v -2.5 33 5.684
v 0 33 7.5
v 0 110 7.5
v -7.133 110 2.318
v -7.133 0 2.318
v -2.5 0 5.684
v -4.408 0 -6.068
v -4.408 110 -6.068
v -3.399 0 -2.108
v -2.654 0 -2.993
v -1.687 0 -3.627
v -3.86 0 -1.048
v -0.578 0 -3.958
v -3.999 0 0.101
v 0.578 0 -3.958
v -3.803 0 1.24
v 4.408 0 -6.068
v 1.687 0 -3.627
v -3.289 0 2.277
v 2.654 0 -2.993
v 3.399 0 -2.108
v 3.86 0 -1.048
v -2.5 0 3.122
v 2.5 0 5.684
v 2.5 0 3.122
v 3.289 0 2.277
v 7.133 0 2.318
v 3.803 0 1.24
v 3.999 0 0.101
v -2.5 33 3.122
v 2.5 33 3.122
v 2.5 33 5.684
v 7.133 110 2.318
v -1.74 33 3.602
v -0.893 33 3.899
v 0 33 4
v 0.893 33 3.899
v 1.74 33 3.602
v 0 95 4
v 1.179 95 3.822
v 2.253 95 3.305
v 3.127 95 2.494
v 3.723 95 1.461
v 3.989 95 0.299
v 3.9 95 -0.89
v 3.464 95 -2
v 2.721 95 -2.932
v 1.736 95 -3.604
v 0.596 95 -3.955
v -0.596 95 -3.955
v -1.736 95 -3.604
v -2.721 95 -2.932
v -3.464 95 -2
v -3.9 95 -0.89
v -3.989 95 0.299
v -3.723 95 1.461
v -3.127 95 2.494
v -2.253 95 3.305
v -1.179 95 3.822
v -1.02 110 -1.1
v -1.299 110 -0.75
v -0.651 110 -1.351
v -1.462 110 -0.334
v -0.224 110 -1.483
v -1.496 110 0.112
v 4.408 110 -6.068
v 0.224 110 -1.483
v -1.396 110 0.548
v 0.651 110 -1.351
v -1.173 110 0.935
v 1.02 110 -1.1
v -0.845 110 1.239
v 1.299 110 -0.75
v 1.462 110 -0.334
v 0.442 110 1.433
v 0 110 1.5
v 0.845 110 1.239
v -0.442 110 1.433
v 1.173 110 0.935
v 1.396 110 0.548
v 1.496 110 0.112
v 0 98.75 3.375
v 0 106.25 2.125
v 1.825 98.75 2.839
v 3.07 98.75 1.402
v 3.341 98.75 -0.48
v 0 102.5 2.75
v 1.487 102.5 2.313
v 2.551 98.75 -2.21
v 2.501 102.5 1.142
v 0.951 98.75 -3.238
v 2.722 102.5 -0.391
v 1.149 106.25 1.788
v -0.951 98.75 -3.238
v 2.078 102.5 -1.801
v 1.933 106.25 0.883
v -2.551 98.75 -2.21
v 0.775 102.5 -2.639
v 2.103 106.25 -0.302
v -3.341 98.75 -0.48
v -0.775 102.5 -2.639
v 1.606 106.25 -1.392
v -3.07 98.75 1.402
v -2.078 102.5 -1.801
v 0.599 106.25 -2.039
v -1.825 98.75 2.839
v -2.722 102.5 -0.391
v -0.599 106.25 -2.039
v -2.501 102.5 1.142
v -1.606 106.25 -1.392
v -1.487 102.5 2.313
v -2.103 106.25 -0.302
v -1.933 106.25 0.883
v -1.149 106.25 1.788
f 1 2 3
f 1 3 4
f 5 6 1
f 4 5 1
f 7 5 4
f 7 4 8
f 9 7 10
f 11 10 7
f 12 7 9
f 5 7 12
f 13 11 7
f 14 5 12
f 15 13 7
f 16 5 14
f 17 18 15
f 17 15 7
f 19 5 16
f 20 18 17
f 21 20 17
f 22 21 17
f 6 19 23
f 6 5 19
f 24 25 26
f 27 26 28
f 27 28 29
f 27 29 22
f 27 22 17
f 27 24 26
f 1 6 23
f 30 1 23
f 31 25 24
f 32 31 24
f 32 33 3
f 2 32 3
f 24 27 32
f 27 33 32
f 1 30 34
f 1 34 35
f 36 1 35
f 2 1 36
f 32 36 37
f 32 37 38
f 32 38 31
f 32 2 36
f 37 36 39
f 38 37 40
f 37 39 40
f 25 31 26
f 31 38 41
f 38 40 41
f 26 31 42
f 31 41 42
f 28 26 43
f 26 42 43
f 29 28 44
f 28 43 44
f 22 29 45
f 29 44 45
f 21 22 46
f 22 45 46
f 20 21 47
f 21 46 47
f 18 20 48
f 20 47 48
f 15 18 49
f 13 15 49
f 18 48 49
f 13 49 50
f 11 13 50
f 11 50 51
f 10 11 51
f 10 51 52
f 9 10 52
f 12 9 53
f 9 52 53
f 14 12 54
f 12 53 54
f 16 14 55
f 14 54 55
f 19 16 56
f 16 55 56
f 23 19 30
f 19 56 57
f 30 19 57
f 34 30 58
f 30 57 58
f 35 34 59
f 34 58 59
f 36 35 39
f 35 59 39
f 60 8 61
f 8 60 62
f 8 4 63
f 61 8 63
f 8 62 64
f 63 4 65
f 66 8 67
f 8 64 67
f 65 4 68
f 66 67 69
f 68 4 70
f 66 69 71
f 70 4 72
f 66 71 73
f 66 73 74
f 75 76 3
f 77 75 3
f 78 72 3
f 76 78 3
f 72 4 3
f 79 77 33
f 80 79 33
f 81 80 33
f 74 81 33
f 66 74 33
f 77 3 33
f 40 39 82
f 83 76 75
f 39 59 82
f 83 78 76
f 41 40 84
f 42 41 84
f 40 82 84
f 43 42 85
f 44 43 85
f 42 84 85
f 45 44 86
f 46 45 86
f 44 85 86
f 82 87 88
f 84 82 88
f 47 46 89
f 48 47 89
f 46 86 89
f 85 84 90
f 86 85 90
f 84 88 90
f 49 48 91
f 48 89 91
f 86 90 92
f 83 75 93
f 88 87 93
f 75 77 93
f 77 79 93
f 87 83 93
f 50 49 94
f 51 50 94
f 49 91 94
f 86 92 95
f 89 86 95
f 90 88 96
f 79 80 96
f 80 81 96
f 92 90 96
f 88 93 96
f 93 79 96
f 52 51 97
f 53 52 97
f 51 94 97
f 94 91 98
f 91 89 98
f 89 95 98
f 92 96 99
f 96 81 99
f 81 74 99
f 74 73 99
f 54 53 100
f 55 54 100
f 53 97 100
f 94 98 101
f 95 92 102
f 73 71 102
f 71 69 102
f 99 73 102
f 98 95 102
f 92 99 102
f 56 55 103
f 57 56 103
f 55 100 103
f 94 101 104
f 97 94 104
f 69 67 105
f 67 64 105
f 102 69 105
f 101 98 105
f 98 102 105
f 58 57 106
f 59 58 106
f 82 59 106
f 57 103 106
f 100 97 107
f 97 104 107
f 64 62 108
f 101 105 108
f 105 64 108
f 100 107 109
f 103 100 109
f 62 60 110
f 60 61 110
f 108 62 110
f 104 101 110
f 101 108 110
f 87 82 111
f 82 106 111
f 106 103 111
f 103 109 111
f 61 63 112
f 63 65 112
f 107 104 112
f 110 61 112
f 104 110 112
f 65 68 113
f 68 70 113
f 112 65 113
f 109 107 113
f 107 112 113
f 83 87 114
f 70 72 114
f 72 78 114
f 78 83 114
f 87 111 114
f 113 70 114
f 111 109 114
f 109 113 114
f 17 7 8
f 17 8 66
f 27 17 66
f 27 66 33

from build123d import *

# Parameters (mm, degrees)
F0_R     = 5
F3_DEPTH = 110
F5_DEPTH = 33


with BuildPart() as f2:
    # F1 (on Right) → F2 (revolve)
    with BuildSketch(Plane.YZ):
        Polygon((0, 5.5), (0, 4), (95, 4), (110, 1.5), (110, 5.5), (95, 5.5), align=None)
    revolve(axis=Axis((0, 47.5, 0), (0, 1, 0)))

    # F0 (on Front) → F3 (join)
    with BuildSketch(Plane.XZ):
        Polygon((4.4083893922, -6.0676274578), (7.1329238722, 2.3176274578), (0, 7.5), (-7.1329238722, 2.3176274578), (-4.4083893922, -6.0676274578), align=None)
        Circle(F0_R, mode=Mode.SUBTRACT)
    extrude(amount=-F3_DEPTH)

    # F4 (on face) → F5 (cut)
    with BuildSketch(Plane.XZ):
        with BuildLine():
            Line((-2.5, 5.68364368), (-2.5, 3.1224989992))
            ThreePointArc((-2.5, 3.1224989992), (-1.3247648854, 3.7742546282), (0, 4))
            Line((0, 4), (0, 7.5))
            Line((0, 7.5), (-2.5, 5.68364368))
        make_face()
        with BuildLine():
            ThreePointArc((0, 4), (1.3247648854, 3.7742546282), (2.5, 3.1224989992))
            Line((2.5, 3.1224989992), (2.5, 5.68364368))
            Line((2.5, 5.68364368), (0, 7.5))
            Line((0, 7.5), (0, 4))
        make_face()
    extrude(amount=-F5_DEPTH, mode=Mode.SUBTRACT)


solid = f2.part
